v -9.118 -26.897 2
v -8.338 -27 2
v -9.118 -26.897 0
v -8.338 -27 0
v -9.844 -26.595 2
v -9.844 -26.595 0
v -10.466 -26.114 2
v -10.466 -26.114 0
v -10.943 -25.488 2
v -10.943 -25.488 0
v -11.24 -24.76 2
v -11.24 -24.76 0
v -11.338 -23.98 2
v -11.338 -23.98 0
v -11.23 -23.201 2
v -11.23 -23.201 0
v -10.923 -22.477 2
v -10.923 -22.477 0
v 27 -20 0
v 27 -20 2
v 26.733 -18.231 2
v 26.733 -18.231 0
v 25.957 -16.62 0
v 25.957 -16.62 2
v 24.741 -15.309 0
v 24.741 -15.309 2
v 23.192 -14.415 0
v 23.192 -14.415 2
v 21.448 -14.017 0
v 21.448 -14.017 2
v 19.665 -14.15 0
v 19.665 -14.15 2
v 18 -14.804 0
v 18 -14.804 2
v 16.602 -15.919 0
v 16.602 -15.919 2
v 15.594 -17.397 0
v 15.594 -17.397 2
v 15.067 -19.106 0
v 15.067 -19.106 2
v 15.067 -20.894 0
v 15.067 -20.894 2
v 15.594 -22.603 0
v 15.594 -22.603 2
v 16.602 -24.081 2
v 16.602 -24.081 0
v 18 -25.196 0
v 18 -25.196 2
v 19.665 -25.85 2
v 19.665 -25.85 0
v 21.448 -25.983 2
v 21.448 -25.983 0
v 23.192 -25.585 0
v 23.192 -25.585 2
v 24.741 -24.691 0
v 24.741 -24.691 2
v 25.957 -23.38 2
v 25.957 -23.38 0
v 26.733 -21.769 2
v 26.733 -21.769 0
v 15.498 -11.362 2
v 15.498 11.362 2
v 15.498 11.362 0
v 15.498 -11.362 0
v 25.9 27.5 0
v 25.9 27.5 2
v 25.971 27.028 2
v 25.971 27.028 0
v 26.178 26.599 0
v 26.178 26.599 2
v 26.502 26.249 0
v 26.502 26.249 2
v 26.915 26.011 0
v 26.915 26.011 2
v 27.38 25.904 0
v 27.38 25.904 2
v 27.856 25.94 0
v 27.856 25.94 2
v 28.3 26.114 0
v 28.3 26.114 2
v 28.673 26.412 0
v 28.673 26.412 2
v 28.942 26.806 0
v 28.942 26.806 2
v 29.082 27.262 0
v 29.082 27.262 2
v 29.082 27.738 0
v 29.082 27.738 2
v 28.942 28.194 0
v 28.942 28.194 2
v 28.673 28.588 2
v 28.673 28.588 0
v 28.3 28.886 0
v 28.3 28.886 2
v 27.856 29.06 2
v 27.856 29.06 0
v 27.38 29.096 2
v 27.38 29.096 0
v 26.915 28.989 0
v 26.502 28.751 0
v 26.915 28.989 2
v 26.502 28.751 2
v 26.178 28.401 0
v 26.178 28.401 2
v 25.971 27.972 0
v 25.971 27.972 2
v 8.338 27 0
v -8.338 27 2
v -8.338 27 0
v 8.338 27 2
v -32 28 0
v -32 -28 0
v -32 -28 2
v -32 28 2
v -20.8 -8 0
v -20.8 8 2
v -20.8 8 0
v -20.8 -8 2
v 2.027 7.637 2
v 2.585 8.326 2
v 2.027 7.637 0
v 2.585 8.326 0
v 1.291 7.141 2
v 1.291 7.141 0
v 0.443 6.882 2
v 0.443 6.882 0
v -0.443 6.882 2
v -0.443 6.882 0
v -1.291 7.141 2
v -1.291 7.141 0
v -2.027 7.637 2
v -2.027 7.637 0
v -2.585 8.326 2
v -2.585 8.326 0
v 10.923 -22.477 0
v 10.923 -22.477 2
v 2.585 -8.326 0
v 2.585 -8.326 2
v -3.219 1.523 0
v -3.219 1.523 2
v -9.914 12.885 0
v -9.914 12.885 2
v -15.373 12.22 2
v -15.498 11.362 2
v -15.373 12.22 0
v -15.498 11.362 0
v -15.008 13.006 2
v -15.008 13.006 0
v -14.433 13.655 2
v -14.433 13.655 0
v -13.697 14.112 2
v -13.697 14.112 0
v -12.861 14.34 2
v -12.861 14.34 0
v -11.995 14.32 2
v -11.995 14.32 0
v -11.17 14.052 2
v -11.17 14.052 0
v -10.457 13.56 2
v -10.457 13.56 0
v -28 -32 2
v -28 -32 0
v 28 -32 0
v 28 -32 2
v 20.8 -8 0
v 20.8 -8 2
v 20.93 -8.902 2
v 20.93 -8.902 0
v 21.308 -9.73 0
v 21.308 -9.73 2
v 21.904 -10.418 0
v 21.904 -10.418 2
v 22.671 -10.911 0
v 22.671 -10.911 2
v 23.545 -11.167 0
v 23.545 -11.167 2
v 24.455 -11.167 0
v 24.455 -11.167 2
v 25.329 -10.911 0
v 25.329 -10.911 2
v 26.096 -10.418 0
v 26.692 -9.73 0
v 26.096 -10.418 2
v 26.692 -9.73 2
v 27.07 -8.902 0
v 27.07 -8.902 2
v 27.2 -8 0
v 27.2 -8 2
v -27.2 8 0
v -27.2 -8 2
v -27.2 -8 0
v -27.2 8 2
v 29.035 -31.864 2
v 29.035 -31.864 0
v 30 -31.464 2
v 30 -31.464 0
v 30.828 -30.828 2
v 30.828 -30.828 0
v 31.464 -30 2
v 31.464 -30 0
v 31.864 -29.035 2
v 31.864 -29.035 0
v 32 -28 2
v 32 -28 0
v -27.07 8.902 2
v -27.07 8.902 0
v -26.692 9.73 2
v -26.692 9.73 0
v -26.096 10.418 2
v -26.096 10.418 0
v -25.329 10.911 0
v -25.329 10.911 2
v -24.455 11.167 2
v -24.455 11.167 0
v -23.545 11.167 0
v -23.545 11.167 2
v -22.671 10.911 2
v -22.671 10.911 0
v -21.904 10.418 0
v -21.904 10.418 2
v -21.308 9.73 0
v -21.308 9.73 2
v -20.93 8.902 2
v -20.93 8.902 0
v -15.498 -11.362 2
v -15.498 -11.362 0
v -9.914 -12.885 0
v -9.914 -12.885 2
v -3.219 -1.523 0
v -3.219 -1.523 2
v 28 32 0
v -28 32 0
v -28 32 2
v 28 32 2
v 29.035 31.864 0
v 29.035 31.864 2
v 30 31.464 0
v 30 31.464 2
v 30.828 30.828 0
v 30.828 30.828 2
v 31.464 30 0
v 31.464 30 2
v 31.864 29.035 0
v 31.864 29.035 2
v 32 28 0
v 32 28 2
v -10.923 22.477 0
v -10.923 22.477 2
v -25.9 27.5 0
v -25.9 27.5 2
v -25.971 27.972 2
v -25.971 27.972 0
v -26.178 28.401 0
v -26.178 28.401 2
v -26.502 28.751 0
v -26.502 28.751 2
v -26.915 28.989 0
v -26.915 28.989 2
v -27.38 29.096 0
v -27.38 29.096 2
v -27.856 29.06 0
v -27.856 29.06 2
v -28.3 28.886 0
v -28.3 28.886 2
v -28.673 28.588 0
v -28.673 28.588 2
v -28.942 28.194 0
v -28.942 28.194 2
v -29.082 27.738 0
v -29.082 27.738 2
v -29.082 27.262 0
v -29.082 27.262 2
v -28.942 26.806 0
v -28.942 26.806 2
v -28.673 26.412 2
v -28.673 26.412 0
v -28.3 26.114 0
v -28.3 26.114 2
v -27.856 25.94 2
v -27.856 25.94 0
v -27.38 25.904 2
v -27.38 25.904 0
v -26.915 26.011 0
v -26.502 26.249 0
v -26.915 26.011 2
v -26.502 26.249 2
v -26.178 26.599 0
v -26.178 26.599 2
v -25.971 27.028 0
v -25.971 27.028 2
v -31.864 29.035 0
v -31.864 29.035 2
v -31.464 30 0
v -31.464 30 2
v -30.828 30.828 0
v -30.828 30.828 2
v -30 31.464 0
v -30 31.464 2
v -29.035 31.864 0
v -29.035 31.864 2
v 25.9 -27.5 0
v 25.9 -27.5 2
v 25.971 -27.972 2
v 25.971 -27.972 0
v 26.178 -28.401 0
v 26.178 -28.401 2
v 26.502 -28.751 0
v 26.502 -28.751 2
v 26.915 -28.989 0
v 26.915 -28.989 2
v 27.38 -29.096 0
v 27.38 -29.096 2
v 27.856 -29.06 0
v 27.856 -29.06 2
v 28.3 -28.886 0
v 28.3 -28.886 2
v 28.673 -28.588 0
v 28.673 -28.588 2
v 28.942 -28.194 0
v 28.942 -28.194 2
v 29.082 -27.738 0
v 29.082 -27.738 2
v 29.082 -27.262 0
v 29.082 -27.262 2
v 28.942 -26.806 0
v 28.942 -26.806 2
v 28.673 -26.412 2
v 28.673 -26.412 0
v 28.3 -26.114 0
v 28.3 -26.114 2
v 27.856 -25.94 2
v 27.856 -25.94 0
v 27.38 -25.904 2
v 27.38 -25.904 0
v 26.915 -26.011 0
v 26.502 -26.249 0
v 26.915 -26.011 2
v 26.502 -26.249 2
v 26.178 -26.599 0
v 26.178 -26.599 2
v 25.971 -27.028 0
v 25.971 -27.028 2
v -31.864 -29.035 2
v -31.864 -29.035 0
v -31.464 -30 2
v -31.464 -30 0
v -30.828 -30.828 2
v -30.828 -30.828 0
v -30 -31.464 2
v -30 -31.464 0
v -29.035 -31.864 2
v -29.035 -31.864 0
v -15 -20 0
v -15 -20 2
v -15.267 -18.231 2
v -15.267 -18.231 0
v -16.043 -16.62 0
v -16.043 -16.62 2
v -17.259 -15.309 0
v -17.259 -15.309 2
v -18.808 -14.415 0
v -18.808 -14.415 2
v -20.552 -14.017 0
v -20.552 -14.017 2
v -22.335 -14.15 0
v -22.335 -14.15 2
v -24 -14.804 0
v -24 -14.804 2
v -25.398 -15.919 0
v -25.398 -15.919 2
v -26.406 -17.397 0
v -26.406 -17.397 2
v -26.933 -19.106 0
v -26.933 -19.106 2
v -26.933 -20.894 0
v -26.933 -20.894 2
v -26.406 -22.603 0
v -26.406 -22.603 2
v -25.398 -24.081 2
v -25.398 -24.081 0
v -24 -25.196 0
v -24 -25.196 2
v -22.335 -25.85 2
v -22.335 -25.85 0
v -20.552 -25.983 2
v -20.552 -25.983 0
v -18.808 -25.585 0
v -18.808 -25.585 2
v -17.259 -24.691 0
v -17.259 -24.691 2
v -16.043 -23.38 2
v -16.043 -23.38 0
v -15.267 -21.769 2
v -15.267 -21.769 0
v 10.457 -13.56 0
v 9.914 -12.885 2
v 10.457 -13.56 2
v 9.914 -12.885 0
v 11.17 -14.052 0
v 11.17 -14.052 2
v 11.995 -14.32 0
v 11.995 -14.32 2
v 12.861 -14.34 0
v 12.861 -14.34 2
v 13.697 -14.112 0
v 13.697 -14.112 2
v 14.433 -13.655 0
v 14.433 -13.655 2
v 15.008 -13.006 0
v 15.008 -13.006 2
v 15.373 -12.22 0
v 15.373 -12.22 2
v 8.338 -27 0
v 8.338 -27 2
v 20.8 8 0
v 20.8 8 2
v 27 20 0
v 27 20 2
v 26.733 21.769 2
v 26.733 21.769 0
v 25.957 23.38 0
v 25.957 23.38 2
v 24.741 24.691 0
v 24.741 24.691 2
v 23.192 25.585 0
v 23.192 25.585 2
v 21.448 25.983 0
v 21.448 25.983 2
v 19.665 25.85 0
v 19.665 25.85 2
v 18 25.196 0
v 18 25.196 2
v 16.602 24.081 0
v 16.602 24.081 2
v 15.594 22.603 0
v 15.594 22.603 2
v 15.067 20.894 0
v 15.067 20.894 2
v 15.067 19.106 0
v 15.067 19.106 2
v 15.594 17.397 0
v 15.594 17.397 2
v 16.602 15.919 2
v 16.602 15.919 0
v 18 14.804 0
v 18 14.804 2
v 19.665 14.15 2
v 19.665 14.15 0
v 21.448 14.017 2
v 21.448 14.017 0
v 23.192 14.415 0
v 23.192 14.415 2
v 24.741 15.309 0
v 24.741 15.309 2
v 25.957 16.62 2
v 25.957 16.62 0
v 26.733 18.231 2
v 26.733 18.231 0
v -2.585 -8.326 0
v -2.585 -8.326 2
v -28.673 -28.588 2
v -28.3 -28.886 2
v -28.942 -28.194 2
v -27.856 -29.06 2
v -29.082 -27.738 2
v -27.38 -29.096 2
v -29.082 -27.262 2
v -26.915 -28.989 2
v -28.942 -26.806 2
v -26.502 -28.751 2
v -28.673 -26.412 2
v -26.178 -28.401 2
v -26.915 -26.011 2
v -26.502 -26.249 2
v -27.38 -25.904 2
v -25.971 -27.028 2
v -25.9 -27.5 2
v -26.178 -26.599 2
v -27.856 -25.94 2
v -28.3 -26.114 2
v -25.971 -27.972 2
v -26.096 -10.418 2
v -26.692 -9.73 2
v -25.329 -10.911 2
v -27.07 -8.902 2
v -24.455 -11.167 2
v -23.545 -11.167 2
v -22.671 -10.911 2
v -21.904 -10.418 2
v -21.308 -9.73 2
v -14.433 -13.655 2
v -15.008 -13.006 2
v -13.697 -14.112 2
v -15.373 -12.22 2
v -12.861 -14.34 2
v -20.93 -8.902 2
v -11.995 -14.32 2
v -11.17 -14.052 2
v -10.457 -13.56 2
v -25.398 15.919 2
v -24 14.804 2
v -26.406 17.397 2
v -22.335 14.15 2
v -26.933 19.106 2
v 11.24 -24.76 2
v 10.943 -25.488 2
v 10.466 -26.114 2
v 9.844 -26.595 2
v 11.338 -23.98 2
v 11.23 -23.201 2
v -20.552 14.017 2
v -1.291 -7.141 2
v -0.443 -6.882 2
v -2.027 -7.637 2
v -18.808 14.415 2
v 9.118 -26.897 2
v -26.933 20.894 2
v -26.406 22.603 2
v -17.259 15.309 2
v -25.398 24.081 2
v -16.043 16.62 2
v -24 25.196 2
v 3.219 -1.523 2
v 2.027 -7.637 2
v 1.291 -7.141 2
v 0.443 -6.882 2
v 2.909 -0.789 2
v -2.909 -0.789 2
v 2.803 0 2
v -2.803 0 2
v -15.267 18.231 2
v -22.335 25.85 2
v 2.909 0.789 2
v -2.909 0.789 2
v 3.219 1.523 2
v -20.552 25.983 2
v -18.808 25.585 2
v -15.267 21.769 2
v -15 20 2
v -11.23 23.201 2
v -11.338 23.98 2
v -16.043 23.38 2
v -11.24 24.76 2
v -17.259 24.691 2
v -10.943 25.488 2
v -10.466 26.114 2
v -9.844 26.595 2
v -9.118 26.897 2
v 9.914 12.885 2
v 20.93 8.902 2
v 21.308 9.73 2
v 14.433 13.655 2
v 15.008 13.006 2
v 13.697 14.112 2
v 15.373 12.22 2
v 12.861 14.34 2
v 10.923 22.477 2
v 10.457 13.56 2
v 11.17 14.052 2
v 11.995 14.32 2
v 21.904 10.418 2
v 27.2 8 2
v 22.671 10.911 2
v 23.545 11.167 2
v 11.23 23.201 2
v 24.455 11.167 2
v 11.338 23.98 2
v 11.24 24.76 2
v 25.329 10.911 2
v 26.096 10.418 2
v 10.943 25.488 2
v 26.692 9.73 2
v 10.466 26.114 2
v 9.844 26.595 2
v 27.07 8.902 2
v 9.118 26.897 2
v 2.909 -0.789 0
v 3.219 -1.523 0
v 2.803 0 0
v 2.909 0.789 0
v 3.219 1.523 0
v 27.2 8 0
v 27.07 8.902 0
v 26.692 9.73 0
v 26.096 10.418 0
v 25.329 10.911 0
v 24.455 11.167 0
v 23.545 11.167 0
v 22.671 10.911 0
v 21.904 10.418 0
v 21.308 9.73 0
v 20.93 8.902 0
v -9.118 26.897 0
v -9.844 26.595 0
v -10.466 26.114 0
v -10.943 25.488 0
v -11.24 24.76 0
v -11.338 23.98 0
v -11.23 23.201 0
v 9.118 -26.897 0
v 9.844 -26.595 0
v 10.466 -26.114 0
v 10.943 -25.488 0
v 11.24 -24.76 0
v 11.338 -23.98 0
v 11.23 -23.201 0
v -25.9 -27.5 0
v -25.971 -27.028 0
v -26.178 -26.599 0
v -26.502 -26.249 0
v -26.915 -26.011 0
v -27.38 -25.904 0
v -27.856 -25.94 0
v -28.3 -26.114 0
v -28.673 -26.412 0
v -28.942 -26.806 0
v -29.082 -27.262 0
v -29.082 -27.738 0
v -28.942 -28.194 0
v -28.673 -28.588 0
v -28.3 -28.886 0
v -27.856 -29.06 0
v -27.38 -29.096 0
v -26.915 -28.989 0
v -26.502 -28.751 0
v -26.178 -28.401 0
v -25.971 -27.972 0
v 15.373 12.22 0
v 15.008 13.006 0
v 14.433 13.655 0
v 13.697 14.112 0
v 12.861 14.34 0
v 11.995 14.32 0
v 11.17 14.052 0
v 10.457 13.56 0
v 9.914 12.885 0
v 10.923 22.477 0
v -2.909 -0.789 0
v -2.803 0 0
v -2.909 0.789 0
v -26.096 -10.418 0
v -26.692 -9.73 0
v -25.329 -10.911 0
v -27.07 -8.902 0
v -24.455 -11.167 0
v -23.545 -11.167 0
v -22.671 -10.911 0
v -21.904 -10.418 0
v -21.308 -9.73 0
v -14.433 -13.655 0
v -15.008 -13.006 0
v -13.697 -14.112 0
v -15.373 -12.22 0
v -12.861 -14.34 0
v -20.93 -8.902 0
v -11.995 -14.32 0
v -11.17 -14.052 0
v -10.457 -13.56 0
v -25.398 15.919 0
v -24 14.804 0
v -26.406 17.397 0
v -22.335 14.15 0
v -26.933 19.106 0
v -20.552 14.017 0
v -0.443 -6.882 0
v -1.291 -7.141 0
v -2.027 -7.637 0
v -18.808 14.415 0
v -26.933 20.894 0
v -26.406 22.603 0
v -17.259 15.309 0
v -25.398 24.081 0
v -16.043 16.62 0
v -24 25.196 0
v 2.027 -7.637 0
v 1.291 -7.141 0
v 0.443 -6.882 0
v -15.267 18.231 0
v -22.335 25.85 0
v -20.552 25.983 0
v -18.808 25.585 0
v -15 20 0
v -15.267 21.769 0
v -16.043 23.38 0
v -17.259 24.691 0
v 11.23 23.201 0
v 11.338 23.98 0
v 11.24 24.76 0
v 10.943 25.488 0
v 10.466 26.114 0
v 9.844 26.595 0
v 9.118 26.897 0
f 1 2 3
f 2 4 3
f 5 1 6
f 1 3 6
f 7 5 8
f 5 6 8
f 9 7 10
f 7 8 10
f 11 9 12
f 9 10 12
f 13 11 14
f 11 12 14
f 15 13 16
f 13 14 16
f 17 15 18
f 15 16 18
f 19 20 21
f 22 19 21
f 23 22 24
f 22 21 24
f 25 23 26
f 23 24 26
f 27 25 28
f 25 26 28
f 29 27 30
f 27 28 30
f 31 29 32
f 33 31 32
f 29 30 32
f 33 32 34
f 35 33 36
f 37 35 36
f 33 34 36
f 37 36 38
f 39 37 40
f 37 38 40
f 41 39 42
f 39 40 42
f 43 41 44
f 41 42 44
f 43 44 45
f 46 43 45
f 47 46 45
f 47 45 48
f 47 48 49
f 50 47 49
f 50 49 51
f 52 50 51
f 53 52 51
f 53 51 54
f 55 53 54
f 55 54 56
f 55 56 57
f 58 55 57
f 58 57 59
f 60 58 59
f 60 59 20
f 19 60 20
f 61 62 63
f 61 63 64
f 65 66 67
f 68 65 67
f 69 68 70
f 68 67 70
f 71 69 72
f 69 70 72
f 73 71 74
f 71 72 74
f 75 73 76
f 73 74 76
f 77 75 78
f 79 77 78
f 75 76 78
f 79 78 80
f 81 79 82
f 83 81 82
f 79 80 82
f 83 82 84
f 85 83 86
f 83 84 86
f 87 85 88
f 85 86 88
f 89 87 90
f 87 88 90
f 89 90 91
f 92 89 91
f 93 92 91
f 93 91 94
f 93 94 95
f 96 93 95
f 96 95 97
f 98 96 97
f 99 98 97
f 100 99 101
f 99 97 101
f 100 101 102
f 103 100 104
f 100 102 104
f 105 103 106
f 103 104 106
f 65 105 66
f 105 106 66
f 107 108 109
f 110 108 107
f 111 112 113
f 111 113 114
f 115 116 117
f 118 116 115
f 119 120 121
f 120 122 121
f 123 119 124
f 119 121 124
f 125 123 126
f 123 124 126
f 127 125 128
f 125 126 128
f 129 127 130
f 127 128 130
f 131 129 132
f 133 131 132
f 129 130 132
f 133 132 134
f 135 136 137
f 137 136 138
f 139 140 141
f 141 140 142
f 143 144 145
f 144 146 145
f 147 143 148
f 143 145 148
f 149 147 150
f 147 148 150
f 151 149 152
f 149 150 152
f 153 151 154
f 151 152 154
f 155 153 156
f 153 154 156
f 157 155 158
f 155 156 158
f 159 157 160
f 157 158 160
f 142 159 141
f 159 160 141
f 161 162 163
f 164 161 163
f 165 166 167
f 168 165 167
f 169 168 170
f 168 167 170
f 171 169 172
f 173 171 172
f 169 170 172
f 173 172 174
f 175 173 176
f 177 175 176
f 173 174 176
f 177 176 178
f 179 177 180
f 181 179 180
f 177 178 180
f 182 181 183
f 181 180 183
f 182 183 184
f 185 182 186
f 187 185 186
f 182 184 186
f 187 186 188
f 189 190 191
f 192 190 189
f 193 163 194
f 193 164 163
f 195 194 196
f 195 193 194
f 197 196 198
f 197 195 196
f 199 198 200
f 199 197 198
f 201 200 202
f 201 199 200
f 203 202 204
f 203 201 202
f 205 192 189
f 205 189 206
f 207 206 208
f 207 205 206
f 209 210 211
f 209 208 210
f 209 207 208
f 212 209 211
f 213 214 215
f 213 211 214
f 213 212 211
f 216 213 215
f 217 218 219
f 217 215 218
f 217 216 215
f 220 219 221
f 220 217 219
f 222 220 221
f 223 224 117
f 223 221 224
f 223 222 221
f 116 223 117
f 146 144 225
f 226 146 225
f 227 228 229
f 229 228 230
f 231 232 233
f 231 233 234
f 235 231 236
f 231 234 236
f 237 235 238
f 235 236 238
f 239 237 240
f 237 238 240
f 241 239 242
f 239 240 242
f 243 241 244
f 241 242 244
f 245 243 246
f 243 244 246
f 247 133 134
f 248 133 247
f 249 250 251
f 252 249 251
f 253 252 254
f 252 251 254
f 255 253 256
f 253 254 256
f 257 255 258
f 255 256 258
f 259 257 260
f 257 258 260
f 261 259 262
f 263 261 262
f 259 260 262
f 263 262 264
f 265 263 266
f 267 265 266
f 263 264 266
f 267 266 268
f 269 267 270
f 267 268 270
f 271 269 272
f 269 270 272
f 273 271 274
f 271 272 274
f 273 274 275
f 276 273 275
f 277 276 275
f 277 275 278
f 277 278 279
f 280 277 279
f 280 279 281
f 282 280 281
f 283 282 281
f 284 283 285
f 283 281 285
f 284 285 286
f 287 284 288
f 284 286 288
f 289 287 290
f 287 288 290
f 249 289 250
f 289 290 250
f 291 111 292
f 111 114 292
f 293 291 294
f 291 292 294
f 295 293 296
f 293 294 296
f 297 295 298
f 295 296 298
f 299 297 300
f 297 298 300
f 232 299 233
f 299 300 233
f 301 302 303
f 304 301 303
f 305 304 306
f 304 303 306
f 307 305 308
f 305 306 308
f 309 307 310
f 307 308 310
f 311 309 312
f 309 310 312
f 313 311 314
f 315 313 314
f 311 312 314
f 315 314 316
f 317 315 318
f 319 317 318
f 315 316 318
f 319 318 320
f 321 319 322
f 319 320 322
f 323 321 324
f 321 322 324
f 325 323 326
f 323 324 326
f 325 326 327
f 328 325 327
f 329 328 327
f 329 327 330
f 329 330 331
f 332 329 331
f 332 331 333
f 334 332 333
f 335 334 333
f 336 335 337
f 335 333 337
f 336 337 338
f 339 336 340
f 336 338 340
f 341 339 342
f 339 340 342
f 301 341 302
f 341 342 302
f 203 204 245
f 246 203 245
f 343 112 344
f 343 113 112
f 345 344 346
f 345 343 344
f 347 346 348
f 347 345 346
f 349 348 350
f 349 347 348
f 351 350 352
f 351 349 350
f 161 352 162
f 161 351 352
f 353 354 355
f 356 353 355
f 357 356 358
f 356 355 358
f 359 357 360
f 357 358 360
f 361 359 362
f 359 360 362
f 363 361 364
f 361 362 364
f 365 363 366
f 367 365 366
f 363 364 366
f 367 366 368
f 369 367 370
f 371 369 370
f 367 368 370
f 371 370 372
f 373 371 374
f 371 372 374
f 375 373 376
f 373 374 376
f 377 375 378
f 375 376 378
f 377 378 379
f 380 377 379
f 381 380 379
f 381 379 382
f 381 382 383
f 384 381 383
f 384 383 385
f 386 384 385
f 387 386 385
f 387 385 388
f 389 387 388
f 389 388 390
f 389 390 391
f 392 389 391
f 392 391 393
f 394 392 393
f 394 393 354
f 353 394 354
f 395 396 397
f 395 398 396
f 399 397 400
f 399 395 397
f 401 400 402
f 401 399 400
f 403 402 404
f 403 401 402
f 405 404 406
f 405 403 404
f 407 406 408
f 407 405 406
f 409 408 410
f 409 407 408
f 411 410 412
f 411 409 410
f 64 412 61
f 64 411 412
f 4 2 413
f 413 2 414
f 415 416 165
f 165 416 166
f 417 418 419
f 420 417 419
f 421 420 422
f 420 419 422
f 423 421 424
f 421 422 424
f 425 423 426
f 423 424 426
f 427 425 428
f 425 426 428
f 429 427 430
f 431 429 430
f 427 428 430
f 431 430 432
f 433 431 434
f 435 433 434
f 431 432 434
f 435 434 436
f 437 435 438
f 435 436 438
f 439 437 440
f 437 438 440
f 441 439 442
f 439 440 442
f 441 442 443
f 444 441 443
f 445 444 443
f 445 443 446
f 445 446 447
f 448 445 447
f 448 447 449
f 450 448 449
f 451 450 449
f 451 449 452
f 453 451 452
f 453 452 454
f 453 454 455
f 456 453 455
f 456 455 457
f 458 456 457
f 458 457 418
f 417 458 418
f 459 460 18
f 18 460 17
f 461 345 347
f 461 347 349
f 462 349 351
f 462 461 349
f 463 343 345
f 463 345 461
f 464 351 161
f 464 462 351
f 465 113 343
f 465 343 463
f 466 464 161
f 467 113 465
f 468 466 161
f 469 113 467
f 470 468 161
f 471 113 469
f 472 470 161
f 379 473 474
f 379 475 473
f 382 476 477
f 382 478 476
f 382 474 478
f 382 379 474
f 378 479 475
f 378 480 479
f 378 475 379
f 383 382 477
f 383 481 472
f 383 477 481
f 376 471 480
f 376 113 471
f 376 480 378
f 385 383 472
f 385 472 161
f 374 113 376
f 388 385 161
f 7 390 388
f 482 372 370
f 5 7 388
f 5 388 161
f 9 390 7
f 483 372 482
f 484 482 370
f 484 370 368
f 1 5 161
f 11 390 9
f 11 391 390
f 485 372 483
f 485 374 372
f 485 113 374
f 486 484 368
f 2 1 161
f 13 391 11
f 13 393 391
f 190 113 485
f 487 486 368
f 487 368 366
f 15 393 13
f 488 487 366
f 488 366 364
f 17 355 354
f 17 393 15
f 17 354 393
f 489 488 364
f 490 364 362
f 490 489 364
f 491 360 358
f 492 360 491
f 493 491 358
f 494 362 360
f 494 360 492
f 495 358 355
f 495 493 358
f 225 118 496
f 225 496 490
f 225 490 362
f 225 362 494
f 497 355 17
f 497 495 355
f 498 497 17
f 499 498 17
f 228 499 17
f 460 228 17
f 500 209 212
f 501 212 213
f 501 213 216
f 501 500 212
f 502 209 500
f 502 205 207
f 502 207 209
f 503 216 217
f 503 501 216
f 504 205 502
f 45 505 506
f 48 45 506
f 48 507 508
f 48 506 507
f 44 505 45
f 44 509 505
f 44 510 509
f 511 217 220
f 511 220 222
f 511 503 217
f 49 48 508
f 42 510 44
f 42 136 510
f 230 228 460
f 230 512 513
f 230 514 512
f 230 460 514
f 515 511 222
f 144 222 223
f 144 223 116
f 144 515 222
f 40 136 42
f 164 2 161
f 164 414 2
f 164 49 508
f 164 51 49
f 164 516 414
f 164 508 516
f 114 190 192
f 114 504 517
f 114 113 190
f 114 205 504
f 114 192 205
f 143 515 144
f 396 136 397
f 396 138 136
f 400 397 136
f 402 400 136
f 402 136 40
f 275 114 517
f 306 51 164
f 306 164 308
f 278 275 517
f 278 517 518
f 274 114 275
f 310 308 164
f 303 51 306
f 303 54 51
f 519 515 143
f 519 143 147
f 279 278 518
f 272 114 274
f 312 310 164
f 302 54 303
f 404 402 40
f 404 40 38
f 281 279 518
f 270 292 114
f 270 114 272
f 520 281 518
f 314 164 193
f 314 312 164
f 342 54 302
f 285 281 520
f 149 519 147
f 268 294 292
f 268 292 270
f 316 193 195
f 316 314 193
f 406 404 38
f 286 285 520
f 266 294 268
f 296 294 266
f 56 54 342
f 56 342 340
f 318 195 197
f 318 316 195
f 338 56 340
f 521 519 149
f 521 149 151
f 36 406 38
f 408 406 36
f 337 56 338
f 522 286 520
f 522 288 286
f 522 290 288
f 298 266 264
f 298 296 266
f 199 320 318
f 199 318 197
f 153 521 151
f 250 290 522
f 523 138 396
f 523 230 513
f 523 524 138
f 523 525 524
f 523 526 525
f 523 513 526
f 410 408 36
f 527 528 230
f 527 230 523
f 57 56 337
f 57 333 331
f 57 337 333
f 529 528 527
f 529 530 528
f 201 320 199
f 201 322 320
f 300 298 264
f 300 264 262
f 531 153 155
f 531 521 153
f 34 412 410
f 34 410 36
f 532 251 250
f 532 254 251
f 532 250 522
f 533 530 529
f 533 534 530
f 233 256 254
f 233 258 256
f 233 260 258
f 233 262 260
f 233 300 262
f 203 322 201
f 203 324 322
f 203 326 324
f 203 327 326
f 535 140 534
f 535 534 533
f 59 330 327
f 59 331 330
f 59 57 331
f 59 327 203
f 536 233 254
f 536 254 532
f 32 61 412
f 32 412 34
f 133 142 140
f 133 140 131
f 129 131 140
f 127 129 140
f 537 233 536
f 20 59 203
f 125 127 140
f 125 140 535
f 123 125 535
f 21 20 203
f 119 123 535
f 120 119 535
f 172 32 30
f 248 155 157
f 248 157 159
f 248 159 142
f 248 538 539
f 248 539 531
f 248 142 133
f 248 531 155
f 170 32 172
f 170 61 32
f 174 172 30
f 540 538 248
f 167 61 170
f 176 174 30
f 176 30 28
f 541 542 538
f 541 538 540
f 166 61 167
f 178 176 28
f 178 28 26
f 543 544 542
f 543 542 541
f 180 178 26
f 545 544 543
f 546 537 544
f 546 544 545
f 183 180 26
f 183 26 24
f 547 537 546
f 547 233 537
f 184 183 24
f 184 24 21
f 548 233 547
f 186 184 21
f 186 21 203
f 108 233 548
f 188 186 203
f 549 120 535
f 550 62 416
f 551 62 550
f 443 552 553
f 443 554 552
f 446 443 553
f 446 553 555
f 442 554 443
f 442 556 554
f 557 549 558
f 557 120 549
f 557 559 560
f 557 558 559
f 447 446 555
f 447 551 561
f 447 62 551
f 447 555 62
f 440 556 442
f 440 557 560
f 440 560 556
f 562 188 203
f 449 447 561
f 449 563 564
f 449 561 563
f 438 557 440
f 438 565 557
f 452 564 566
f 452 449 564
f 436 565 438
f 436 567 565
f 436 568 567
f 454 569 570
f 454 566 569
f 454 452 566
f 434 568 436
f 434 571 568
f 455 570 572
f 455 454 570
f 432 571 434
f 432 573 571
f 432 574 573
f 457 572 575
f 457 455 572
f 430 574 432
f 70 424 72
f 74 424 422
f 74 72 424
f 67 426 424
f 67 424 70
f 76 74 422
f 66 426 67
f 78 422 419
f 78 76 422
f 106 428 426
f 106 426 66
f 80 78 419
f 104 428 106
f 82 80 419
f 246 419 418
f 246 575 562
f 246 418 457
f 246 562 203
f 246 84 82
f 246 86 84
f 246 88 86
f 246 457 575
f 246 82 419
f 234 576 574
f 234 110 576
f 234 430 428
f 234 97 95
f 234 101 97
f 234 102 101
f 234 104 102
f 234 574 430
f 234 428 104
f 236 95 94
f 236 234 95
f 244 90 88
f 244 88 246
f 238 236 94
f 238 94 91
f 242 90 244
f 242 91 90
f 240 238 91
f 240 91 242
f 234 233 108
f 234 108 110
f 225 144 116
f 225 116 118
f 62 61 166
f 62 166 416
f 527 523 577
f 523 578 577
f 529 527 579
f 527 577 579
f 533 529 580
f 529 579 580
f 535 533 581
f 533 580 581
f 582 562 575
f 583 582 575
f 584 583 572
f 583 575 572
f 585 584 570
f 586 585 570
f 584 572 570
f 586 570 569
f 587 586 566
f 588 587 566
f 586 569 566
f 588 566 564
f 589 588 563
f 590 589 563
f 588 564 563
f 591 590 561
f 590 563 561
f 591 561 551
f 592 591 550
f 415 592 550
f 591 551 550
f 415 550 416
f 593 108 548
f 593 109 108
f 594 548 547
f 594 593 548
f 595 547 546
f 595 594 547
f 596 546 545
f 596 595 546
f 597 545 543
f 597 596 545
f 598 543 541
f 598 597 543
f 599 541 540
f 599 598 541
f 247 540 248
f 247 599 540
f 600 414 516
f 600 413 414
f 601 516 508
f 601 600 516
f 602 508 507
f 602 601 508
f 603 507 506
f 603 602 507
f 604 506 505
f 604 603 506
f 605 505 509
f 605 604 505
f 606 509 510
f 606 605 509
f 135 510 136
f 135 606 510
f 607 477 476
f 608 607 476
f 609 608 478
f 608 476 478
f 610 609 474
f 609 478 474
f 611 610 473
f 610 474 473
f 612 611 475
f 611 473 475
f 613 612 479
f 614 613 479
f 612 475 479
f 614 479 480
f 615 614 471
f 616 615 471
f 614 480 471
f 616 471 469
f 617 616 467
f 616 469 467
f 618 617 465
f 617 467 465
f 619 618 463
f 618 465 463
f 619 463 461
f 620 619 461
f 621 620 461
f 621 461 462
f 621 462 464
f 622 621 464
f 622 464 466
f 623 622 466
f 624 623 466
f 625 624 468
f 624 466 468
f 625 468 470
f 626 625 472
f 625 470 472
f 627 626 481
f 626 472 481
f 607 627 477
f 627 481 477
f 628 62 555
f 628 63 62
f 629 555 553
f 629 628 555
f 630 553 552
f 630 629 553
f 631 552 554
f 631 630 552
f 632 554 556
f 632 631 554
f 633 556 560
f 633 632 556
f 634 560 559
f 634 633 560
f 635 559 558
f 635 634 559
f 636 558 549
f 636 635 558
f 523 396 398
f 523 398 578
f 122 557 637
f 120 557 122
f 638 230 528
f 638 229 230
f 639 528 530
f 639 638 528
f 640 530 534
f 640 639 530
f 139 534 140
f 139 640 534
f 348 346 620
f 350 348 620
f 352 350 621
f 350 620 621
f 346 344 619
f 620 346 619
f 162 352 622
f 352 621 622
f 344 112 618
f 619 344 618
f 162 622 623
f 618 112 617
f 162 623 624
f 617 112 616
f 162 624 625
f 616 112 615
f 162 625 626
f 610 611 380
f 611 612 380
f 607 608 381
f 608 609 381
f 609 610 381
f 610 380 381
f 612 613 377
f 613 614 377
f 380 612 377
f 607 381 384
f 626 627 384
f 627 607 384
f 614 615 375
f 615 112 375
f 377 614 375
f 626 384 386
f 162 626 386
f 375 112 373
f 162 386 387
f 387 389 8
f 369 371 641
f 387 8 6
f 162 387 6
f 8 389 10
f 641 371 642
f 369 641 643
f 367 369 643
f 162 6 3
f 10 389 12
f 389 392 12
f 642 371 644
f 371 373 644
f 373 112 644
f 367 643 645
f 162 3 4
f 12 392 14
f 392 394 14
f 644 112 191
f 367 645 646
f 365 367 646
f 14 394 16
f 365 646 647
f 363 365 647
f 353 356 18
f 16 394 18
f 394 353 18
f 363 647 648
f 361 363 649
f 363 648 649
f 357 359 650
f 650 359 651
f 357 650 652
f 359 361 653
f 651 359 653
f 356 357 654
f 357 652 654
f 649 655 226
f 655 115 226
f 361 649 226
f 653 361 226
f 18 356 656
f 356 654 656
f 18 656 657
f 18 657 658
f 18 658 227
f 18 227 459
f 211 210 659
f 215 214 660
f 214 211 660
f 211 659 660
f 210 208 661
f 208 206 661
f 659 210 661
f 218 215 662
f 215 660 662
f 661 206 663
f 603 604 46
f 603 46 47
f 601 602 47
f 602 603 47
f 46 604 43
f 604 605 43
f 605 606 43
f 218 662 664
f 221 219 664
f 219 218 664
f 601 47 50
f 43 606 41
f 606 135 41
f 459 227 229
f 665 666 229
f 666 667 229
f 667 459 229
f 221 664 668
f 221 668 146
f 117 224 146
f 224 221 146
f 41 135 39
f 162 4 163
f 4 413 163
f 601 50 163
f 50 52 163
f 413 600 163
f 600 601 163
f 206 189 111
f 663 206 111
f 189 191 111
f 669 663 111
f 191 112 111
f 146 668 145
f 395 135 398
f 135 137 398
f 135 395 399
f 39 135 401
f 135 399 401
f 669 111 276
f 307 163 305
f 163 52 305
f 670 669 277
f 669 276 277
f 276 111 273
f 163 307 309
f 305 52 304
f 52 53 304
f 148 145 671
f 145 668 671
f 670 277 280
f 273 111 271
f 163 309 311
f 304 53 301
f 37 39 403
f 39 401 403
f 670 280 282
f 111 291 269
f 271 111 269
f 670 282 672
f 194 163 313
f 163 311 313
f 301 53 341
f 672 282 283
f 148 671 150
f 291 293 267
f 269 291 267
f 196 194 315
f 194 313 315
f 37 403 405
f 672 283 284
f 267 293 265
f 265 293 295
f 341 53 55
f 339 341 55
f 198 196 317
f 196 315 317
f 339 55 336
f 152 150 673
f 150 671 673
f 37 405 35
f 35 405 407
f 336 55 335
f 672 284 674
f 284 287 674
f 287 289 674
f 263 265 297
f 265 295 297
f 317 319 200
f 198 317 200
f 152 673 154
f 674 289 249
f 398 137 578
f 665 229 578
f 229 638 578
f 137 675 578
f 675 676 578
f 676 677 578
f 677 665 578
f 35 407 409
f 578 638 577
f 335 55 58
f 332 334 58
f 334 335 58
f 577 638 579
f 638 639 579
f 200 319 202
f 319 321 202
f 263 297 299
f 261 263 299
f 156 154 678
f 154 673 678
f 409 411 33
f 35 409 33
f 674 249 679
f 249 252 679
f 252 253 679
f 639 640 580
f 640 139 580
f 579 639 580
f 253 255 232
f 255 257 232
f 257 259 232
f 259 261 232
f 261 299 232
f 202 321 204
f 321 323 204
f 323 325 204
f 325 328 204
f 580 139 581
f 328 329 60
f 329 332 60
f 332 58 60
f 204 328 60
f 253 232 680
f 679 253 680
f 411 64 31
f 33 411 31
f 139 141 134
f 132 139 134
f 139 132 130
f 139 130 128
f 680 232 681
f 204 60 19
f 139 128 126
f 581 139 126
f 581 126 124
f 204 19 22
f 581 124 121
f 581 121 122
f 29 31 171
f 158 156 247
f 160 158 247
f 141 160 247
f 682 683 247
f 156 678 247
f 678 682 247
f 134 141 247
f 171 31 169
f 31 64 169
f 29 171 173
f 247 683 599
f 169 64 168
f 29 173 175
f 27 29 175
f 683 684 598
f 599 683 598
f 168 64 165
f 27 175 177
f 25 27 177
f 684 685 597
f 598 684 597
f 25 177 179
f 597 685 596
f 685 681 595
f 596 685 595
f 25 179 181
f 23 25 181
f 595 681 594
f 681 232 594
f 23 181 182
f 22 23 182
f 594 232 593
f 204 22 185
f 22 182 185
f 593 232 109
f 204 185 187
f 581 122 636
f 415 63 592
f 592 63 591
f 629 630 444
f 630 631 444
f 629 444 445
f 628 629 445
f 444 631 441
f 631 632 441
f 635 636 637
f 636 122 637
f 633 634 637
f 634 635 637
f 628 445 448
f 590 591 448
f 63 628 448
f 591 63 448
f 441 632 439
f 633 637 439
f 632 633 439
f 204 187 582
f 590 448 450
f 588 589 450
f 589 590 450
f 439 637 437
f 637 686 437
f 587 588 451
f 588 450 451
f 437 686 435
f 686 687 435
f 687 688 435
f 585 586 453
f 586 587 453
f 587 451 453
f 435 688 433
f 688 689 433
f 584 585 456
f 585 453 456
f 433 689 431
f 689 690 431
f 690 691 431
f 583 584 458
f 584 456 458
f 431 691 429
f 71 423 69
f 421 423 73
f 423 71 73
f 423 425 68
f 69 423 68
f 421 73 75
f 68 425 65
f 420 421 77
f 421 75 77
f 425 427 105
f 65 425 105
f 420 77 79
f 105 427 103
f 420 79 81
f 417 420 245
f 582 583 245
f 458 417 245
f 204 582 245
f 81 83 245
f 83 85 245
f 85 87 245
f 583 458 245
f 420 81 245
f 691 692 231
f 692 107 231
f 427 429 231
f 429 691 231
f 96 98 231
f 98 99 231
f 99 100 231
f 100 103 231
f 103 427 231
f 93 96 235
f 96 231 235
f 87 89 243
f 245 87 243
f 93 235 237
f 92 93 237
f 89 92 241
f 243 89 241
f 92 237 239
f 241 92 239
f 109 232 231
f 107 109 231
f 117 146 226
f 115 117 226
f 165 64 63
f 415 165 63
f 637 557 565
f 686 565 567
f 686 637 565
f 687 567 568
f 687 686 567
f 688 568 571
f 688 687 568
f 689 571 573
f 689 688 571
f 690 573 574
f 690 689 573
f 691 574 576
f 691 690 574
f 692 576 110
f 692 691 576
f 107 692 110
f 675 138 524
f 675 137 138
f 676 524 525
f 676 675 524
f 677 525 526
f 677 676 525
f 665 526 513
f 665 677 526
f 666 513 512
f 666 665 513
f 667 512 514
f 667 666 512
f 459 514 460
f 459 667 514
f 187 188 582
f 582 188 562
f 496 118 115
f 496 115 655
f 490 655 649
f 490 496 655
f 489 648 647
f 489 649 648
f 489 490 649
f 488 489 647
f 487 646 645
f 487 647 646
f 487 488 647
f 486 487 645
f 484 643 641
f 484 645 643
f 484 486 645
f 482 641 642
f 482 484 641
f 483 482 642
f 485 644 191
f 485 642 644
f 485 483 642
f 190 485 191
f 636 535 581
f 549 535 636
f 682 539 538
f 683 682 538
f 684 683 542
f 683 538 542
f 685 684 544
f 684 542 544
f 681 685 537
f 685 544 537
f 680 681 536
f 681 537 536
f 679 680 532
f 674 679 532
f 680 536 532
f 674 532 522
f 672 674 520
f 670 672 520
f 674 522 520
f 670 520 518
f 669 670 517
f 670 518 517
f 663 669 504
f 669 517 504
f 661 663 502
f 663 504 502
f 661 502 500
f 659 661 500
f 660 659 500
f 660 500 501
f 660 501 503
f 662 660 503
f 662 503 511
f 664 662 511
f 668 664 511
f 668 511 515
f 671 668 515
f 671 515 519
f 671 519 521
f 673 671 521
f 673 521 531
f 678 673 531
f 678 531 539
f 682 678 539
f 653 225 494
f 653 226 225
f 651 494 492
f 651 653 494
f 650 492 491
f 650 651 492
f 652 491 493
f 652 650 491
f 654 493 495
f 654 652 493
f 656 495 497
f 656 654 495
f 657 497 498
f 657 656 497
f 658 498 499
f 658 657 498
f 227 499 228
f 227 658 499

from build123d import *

# Parameters (mm, degrees)
SKETCH_1_W          = 64
SKETCH_1_H          = 64
EXTRUDE_1_DEPTH     = 2
SKETCH_2_R          = 1.6
CUT_EXTRUDE_1_DEPTH = 2
FILLET_1_R          = 4
CUT_EXTRUDE_2_DEPTH = 10
CUT_EXTRUDE_3_DEPTH = 10
FILLET_2_R          = 3
SKETCH_5_R          = 6
CUT_EXTRUDE_4_DEPTH = 10


with BuildPart() as part:
    # 草图1 → 凸台-拉伸1 (new body)
    with BuildSketch(Plane.XY):
        Rectangle(SKETCH_1_W, SKETCH_1_H)
    extrude(amount=EXTRUDE_1_DEPTH)

    # 草图2 → 切除-拉伸1 (cut)
    with BuildSketch(Plane.XY.offset(2)):
        with Locations((-27.5, -27.5)):
            Circle(SKETCH_2_R)
        with Locations((-27.5, 27.5)):
            Circle(SKETCH_2_R)
        with Locations(Location((27.5, -27.5, 0), (0, 0, 180))):
            Circle(SKETCH_2_R)
        with Locations(Location((27.5, 27.5, 0), (0, 0, 180))):
            Circle(SKETCH_2_R)
    extrude(amount=-CUT_EXTRUDE_1_DEPTH, mode=Mode.SUBTRACT)

    # 圆角1
    fillet_1_edges = [part.edges().sort_by_distance(p)[0] for p in [
        (32, -32, 1),
        (-32, -32, 1),
        (-32, 32, 1),
        (32, 32, 1),
    ]]
    fillet(fillet_1_edges, radius=FILLET_1_R)

    # 草图3 → 切除-拉伸2 (cut)
    with BuildSketch(Plane.XY.offset(2)):
        with BuildLine():
            Line((-20.8, 8), (-20.8, -8))
            ThreePointArc((-20.8, -8), (-24, -11.2), (-27.2, -8))
            Line((-27.2, -8), (-27.2, 8))
            ThreePointArc((-27.2, 8), (-24, 11.2), (-20.8, 8))
        make_face()
        with BuildLine():
            Line((20.8, 8), (20.8, -8))
            ThreePointArc((20.8, -8), (24, -11.2), (27.2, -8))
            Line((27.2, -8), (27.2, 8))
            ThreePointArc((27.2, 8), (24, 11.2), (20.8, 8))
        make_face()
    extrude(amount=-CUT_EXTRUDE_2_DEPTH, mode=Mode.SUBTRACT)

    # 草图4 → 切除-拉伸3 (cut)
    with BuildSketch(Plane.XY.offset(2)):
        Polygon((-15.498284962, 22.363155997), (-15.498284962, -22.363155997), (-2.32136638, 0), align=None)
        Polygon((-13.587694119, -27), (13.587694119, -27), (0, -3.939697902), align=None)
        Polygon((2.32136638, 0), (15.498284962, 22.363155997), (15.498284962, -22.363155997), align=None)
        Polygon((0, 3.939697902), (-13.587694119, 27), (13.587694119, 27), align=None)
    extrude(amount=-CUT_EXTRUDE_3_DEPTH, mode=Mode.SUBTRACT)

    # 圆角2
    fillet_2_edges = [part.edges().sort_by_distance(p)[0] for p in [
        (15.498284962, -22.363155997, 1),
        (2.32136638, 0, 1),
        (15.498284962, 22.363155997, 1),
        (-13.587694119, -27, 1),
        (0, -3.939697902, 1),
        (13.587694119, -27, 1),
        (13.587694119, 27, 1),
        (0, 3.939697902, 1),
        (-13.587694119, 27, 1),
        (-2.32136638, 0, 1),
        (-15.498284962, -22.363155997, 1),
        (-15.498284962, 22.363155997, 1),
    ]]
    fillet(fillet_2_edges, radius=FILLET_2_R)

    # 草图5 → 切除-拉伸4 (cut)
    with BuildSketch(Plane.XY.offset(2)):
        with Locations((21, 20)):
            Circle(SKETCH_5_R)
        with Locations((-21, 20)):
            Circle(SKETCH_5_R)
        with Locations((21, -20)):
            Circle(SKETCH_5_R)
        with Locations((-21, -20)):
            Circle(SKETCH_5_R)
    extrude(amount=-CUT_EXTRUDE_4_DEPTH, mode=Mode.SUBTRACT)


solid = part.part
